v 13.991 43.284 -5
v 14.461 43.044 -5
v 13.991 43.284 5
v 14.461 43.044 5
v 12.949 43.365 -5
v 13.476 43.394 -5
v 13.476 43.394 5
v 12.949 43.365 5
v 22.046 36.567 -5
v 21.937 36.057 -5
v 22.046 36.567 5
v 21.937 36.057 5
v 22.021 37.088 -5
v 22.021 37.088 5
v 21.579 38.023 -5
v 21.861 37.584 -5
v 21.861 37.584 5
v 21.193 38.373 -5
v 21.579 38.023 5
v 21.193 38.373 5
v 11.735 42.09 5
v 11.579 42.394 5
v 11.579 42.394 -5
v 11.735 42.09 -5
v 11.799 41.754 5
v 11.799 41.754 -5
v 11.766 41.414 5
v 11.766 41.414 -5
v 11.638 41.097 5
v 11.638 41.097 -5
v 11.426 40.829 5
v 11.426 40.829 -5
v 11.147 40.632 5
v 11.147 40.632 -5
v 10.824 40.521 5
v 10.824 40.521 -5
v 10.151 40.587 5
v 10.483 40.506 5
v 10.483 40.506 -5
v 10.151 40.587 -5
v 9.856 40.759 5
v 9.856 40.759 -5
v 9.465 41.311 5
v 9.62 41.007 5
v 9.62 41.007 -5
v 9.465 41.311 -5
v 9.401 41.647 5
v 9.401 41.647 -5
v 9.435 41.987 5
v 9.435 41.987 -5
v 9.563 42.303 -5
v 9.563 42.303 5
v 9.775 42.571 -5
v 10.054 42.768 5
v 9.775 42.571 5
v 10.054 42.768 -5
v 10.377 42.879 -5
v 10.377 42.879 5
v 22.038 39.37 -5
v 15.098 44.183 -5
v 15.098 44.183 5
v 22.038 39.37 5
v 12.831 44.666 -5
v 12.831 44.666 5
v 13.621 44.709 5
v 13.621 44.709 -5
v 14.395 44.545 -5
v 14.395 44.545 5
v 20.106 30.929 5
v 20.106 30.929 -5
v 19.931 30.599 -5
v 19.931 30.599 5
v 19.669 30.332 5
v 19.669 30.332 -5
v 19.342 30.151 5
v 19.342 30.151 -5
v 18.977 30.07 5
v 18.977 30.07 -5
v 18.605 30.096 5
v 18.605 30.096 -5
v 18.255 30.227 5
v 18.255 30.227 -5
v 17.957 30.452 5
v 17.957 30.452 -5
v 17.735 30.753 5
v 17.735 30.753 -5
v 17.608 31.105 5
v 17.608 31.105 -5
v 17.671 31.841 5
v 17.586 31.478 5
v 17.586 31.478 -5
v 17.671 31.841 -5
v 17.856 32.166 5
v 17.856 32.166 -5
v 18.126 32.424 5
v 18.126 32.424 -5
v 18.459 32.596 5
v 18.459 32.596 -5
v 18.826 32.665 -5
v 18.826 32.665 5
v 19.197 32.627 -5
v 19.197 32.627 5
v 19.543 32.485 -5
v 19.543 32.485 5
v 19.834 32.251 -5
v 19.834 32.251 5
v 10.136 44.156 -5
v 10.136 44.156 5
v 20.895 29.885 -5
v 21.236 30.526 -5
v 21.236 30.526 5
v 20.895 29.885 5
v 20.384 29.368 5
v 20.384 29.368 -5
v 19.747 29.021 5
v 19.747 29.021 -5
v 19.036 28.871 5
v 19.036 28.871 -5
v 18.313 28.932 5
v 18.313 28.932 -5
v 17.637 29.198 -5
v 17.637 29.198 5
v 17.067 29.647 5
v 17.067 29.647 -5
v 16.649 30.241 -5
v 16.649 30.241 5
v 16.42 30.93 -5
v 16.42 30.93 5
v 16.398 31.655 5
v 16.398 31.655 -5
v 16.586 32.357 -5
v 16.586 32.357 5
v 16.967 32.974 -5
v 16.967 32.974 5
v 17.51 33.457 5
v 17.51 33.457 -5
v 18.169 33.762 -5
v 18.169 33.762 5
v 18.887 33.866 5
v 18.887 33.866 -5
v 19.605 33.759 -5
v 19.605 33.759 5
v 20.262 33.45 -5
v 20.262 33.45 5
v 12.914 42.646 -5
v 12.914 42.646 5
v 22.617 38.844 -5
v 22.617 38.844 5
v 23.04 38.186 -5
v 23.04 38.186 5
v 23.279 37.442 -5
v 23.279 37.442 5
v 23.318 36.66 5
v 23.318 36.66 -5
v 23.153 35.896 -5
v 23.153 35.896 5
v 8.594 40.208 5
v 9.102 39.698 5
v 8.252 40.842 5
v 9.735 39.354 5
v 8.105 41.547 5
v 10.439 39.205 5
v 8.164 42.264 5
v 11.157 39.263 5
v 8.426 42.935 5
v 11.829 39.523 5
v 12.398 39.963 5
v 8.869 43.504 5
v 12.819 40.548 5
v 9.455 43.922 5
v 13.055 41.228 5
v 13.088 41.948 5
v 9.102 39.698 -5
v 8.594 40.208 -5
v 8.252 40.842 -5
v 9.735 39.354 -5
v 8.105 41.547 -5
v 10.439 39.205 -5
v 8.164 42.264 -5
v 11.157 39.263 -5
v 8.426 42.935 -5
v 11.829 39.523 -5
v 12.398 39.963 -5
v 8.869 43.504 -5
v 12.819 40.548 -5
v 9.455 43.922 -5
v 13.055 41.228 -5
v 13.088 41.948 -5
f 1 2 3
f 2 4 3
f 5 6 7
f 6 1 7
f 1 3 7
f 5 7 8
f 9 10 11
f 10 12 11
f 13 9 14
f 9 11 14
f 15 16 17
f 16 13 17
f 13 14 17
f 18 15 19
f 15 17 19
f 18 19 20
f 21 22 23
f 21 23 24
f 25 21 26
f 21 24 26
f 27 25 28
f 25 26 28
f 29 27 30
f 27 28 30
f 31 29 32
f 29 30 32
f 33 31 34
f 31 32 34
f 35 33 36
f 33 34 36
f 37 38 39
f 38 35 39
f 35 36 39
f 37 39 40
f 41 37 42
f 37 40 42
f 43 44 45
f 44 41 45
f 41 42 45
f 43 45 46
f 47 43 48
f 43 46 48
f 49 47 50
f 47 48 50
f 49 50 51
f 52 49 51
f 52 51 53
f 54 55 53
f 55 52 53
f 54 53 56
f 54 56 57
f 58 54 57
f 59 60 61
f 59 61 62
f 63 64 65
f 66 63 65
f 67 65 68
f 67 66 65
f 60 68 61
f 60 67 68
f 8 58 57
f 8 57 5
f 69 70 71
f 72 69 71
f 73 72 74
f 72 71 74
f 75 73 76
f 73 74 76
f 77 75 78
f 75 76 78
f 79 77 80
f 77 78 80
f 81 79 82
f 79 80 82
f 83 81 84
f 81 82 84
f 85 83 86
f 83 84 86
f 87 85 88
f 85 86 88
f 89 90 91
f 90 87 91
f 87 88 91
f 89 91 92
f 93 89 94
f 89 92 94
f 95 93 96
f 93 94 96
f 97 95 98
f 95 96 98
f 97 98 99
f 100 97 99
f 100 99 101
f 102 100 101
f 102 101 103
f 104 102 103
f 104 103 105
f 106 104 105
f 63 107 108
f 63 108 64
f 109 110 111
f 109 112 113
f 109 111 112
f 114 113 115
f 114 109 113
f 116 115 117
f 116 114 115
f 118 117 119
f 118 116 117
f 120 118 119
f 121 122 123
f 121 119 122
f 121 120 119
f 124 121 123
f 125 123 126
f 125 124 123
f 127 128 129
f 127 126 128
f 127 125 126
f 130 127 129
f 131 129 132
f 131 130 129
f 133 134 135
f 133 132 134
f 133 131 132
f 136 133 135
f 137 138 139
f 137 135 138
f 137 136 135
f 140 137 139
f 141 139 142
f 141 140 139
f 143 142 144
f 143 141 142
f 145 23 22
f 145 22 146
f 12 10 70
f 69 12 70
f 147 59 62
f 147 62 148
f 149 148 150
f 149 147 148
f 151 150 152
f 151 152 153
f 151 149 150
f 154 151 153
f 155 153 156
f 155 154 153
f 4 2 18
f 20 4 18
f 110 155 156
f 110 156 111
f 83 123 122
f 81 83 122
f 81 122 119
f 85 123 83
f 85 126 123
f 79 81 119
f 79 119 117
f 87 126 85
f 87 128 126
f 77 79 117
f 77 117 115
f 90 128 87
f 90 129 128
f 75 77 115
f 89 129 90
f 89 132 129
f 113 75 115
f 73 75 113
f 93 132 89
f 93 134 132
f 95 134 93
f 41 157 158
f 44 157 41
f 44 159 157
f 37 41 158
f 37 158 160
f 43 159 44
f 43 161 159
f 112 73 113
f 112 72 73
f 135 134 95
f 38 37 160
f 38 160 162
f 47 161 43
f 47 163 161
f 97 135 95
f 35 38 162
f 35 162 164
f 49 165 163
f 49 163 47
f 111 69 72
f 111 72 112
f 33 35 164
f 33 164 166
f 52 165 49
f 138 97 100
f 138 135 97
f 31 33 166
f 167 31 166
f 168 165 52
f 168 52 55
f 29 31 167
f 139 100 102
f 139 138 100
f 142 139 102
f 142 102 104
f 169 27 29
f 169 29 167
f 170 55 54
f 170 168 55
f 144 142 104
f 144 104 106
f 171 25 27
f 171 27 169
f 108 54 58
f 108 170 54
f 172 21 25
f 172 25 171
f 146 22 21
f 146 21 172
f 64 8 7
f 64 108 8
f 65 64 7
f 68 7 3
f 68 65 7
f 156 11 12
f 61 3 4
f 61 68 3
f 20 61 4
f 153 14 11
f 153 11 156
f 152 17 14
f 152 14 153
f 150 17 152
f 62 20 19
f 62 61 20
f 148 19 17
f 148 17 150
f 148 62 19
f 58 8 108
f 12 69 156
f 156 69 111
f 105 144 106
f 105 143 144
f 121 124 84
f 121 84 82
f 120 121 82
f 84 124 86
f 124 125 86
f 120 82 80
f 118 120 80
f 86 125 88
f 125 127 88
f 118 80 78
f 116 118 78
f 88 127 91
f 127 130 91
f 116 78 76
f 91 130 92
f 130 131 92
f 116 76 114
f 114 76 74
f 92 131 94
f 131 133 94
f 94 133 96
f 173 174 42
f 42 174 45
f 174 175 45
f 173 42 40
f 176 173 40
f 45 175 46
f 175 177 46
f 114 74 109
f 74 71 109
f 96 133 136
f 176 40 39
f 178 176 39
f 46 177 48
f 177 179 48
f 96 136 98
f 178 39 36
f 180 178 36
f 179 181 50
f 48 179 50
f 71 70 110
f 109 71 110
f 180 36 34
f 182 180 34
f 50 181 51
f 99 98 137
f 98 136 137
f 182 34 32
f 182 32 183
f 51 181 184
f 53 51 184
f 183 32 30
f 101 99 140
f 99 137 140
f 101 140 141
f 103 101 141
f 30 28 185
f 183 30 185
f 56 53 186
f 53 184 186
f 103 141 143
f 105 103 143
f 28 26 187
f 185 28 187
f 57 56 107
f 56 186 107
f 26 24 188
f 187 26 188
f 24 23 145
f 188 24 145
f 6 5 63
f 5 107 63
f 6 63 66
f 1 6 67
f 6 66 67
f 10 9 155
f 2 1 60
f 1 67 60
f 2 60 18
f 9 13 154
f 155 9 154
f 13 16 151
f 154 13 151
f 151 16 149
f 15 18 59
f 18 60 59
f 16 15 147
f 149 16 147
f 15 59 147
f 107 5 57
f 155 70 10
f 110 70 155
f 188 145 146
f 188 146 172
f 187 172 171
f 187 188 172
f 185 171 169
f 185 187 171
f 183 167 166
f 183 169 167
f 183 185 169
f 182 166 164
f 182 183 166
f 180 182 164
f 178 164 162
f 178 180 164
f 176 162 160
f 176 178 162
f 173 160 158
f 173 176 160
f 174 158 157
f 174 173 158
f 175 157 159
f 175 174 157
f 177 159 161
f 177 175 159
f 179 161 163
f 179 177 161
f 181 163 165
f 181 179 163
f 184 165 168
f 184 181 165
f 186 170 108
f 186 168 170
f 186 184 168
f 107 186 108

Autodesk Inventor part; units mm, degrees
ref_plane "YZ Plane" through (0, 0, 0) normal (1, 0, 0) x (0, 1, 0)
ref_plane "XZ Plane" through (0, 0, 0) normal (0, 1, 0) x (-1, 0, 0)
ref_plane "XY Plane" through (0, 0, 0) normal (0, 0, 1) x (1, 0, 0)
sketch "Sketch1" plane through (0, 0, 0) normal (0, 0, 1) x (1, 0, 0)
  arc A0 (10.377, 42.8791) -> (11.579, 42.394) centre (10.6, 41.7) ccw
  arc A1 (10.1355, 44.1565) -> (12.9139, 42.6464) centre (10.6, 41.7) ccw
  arc A2 (20.2623, 33.4501) -> (21.2356, 30.5256) centre (18.8812, 31.3663) ccw
  line L0 (10.1355, 44.1565) -> (14.0658, 44.8997)
  line L1 (14.0658, 44.8997) -> (23.9257, 38.0598)
  line L2 (23.9257, 38.0598) -> (21.2356, 30.5256)
  line L3 (10.377, 42.8791) -> (13.7723, 43.5211)
  line L4 (13.7723, 43.5211) -> (22.4517, 37.5001)
  line L5 (22.4517, 37.5001) -> (20.1055, 30.9291)
  line L6 (11.579, 42.394) -> (12.9139, 42.6464)
  line L7 (20.2623, 33.4501) -> (19.834, 32.2506)
  arc A3 (19.834, 32.2506) -> (20.1055, 30.9291) centre (18.8812, 31.3663) ccw
  line L8 (10.6, 41.7) -> (18.8812, 31.3663) construction
  point P0 (0, 0)
  dimension "d0" = 5
  dimension "d1" = 5
  dimension "d2" = 1.3
  dimension "d5" = 1.3
  dimension "d6" = 12
  dimension "d7" = 4
  dimension "d8" = 8
  dimension "d9" = 0.7
  dimension "d10" = 0.7
  dimension "d11" = 62
  dimension "d12" = 1.2
extrude "Extrusion1" add sketch "Sketch1" along normal mid plane 10
fillet "Fillet1" radius 2 2 edges at (22.4517, 37.5001, 0) (13.7723, 43.5211, 0)
fillet "Fillet1" radius 3 2 edges at (14.0658, 44.8997, 0) (23.9257, 38.0598, 0)
properties part number "Linkage for inset hinge" material "Steel"
